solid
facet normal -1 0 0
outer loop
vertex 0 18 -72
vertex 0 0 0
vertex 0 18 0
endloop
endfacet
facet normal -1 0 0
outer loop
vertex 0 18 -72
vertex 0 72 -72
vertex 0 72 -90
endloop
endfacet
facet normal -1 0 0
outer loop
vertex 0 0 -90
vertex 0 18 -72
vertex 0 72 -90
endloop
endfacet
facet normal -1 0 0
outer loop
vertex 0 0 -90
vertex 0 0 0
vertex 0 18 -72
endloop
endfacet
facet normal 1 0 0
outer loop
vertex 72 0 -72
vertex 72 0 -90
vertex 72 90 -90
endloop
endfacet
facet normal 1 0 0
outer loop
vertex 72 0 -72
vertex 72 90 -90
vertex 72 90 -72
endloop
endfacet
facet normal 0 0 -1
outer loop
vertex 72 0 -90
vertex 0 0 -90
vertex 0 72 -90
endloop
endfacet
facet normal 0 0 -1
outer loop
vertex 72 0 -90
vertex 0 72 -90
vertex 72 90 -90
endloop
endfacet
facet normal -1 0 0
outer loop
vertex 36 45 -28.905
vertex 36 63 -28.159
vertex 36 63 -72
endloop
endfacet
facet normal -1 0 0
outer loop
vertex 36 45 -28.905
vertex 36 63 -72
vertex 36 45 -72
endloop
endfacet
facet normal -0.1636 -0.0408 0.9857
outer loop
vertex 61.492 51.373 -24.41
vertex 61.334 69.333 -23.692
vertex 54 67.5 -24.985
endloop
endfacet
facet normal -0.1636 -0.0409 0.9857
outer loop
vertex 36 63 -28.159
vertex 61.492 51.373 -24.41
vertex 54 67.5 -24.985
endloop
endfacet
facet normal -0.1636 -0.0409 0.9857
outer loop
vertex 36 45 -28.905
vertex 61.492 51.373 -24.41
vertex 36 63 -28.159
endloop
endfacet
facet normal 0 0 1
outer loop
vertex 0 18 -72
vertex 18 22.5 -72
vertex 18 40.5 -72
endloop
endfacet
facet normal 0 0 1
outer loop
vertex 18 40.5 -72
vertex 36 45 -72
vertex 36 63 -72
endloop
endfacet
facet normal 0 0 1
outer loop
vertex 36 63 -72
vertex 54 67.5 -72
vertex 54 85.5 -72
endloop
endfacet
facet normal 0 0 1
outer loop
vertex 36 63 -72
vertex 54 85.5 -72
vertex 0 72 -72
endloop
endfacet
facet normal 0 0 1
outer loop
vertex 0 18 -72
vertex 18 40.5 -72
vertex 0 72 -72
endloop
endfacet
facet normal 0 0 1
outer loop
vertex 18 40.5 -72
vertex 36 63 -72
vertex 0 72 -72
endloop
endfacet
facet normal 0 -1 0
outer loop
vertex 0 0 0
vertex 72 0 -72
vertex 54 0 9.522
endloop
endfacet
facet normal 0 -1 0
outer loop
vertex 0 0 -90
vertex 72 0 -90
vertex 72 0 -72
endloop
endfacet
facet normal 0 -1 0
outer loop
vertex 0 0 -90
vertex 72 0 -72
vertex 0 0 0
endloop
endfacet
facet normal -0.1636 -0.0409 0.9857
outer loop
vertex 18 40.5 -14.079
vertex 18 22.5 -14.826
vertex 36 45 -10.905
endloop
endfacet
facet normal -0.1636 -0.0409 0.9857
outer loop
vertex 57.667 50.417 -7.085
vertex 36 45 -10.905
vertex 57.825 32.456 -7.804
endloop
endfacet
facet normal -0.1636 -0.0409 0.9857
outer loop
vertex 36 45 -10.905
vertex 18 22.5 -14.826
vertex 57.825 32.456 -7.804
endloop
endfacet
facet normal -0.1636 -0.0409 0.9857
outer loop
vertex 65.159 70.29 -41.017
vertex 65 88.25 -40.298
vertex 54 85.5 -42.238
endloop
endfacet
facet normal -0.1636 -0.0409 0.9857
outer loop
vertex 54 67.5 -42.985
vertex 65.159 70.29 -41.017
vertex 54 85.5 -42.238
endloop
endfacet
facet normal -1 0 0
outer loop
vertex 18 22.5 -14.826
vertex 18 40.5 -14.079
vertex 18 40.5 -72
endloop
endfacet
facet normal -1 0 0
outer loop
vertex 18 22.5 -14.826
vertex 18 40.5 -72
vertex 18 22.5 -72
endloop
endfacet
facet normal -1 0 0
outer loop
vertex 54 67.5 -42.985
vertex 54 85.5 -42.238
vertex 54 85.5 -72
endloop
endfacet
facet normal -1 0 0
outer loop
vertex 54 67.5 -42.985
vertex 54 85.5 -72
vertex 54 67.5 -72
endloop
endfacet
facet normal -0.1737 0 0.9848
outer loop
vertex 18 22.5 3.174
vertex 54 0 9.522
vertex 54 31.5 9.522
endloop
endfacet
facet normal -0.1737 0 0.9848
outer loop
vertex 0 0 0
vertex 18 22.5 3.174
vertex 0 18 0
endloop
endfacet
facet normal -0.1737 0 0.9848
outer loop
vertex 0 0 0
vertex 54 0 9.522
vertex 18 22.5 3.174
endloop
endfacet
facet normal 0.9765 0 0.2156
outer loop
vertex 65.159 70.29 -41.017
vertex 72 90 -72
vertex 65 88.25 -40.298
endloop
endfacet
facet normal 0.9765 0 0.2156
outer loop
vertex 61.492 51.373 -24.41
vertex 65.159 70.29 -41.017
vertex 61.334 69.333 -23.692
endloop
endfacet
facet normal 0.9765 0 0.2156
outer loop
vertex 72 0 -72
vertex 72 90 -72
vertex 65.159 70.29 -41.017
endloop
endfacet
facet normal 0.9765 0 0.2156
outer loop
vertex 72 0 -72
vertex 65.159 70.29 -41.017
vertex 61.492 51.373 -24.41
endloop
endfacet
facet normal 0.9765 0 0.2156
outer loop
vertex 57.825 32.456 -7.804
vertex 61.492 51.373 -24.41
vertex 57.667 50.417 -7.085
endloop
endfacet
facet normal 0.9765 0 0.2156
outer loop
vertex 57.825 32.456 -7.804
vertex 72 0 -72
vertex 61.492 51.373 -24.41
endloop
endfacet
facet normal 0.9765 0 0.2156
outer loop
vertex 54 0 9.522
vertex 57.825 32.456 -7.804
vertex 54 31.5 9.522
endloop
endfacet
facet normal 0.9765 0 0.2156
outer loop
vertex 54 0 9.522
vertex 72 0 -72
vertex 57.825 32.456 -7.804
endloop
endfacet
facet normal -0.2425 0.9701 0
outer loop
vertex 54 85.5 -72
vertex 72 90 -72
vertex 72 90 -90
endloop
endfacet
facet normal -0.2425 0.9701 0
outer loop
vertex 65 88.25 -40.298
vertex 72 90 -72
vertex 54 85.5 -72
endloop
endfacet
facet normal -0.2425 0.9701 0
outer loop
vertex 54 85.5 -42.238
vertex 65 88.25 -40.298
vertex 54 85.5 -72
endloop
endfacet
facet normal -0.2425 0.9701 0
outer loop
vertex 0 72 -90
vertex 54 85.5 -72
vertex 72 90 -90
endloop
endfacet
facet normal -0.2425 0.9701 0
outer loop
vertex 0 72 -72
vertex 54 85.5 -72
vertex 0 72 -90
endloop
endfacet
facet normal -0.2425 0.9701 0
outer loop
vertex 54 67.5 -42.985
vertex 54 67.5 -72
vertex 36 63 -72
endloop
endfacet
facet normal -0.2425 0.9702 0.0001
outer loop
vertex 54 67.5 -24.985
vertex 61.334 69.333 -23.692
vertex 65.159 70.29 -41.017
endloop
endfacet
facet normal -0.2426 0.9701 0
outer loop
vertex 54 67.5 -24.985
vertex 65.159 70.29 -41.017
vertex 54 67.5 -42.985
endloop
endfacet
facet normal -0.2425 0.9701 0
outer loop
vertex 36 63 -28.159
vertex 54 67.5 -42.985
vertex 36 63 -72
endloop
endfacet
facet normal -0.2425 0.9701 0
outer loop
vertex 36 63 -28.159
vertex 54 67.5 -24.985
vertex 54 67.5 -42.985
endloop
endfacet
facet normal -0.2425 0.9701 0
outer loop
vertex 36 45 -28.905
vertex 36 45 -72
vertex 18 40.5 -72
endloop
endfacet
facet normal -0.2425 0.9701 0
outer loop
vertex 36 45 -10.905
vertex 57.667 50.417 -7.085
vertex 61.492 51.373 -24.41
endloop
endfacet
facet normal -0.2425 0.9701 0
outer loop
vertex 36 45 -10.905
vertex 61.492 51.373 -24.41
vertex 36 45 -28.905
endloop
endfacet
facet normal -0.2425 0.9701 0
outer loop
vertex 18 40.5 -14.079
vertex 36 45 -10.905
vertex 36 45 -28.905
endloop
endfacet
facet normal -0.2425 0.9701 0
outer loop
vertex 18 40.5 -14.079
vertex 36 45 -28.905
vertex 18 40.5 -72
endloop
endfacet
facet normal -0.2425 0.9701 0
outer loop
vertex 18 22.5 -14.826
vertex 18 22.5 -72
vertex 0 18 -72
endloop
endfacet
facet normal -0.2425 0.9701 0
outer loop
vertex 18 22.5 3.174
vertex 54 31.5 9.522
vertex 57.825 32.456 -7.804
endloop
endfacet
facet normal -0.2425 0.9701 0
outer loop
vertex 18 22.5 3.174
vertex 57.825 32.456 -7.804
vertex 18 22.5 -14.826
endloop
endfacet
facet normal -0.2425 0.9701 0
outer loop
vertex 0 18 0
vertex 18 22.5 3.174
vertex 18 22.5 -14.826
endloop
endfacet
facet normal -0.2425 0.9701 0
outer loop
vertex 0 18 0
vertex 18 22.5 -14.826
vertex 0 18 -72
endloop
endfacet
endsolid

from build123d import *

# Parameters (mm, degrees)
MAIN_BLOCK_DEPTH         = 90
MAIN_CUTOUT_DEPTH        = 10
MAIN_CUTOUT_DEPTH_BACK   = 72
TOP_SLOPE_CUT_DEPTH      = 12
TOP_SLOPE_CUT_DEPTH_BACK = 90
FIRST_STEP_CUT_DEPTH     = 90
SECOND_STEP_CUT_DEPTH    = 50
THIRD_STEP_CUT_DEPTH     = 20


with BuildPart() as part:
    # Sketch1 → Main Block (new body)
    with BuildSketch(Plane(origin=(0, 0, 0), x_dir=(1, 0, 0), z_dir=(0, 1, 0))):
        Polygon((0, 0), (0, 90), (72, 90), (72, 72), (54, -9.521656958), align=None)
    extrude(amount=MAIN_BLOCK_DEPTH)

    # Sketch4 → Main Cutout (cut, two sides)
    with BuildSketch(Plane.XY) as main_cutout_sk:
        Polygon((18, 40.5), (18, 22.5), (0, 18), (0, 90), (54, 90), (54, 67.5), (36, 63), (36, 45), align=None)
    extrude(amount=MAIN_CUTOUT_DEPTH, mode=Mode.SUBTRACT)
    extrude(main_cutout_sk.sketch, amount=-MAIN_CUTOUT_DEPTH_BACK, mode=Mode.SUBTRACT)

    # Sketch5 → Top Slope Cut (cut, two sides)
    with BuildSketch(Plane.XY) as top_slope_cut_sk:
        Polygon((0, 90), (72, 90), (0, 72), align=None)
    extrude(amount=TOP_SLOPE_CUT_DEPTH, mode=Mode.SUBTRACT)
    extrude(top_slope_cut_sk.sketch, amount=-TOP_SLOPE_CUT_DEPTH_BACK, mode=Mode.SUBTRACT)

    # Sketch6 → First Step Cut (cut)
    with BuildSketch(Plane(origin=(-4.235294118, 16.941176471, 0), x_dir=(-0.9701425, -0.242535625, 0), z_dir=(-0.242535625, 0.9701425, 0))):
        Polygon((-92.892158272, -2.856450573), (-85.203658571, 13.828337001), (-4.365641251, 0), (-4.365641251, -18), align=None)
    extrude(amount=FIRST_STEP_CUT_DEPTH, mode=Mode.SUBTRACT)

    # Sketch7 → Second Step Cut (cut)
    with BuildSketch(Plane(origin=(-8.470588235, 33.882352941, 0), x_dir=(-0.9701425, -0.242535625, 0), z_dir=(-0.242535625, 0.9701425, 0))):
        Polygon((-27.285257817, -14.079317723), (-101.742779454, -1.342442975), (-101.770582014, -19.337687006), (-27.285257817, -32.079317723), align=None)
    extrude(amount=SECOND_STEP_CUT_DEPTH, mode=Mode.SUBTRACT)

    # Sketch8 → Third Step Cut (cut)
    with BuildSketch(Plane(origin=(-12.705882353, 50.823529412, 0), x_dir=(-0.9701425, -0.242535625, 0), z_dir=(-0.242535625, 0.9701425, 0))):
        Polygon((-50.204874383, -28.158635446), (-102.913338561, -19.142204445), (-106.827474424, -36.47264337), (-50.204874383, -46.158635446), align=None)
    extrude(amount=THIRD_STEP_CUT_DEPTH, mode=Mode.SUBTRACT)


solid = part.part
